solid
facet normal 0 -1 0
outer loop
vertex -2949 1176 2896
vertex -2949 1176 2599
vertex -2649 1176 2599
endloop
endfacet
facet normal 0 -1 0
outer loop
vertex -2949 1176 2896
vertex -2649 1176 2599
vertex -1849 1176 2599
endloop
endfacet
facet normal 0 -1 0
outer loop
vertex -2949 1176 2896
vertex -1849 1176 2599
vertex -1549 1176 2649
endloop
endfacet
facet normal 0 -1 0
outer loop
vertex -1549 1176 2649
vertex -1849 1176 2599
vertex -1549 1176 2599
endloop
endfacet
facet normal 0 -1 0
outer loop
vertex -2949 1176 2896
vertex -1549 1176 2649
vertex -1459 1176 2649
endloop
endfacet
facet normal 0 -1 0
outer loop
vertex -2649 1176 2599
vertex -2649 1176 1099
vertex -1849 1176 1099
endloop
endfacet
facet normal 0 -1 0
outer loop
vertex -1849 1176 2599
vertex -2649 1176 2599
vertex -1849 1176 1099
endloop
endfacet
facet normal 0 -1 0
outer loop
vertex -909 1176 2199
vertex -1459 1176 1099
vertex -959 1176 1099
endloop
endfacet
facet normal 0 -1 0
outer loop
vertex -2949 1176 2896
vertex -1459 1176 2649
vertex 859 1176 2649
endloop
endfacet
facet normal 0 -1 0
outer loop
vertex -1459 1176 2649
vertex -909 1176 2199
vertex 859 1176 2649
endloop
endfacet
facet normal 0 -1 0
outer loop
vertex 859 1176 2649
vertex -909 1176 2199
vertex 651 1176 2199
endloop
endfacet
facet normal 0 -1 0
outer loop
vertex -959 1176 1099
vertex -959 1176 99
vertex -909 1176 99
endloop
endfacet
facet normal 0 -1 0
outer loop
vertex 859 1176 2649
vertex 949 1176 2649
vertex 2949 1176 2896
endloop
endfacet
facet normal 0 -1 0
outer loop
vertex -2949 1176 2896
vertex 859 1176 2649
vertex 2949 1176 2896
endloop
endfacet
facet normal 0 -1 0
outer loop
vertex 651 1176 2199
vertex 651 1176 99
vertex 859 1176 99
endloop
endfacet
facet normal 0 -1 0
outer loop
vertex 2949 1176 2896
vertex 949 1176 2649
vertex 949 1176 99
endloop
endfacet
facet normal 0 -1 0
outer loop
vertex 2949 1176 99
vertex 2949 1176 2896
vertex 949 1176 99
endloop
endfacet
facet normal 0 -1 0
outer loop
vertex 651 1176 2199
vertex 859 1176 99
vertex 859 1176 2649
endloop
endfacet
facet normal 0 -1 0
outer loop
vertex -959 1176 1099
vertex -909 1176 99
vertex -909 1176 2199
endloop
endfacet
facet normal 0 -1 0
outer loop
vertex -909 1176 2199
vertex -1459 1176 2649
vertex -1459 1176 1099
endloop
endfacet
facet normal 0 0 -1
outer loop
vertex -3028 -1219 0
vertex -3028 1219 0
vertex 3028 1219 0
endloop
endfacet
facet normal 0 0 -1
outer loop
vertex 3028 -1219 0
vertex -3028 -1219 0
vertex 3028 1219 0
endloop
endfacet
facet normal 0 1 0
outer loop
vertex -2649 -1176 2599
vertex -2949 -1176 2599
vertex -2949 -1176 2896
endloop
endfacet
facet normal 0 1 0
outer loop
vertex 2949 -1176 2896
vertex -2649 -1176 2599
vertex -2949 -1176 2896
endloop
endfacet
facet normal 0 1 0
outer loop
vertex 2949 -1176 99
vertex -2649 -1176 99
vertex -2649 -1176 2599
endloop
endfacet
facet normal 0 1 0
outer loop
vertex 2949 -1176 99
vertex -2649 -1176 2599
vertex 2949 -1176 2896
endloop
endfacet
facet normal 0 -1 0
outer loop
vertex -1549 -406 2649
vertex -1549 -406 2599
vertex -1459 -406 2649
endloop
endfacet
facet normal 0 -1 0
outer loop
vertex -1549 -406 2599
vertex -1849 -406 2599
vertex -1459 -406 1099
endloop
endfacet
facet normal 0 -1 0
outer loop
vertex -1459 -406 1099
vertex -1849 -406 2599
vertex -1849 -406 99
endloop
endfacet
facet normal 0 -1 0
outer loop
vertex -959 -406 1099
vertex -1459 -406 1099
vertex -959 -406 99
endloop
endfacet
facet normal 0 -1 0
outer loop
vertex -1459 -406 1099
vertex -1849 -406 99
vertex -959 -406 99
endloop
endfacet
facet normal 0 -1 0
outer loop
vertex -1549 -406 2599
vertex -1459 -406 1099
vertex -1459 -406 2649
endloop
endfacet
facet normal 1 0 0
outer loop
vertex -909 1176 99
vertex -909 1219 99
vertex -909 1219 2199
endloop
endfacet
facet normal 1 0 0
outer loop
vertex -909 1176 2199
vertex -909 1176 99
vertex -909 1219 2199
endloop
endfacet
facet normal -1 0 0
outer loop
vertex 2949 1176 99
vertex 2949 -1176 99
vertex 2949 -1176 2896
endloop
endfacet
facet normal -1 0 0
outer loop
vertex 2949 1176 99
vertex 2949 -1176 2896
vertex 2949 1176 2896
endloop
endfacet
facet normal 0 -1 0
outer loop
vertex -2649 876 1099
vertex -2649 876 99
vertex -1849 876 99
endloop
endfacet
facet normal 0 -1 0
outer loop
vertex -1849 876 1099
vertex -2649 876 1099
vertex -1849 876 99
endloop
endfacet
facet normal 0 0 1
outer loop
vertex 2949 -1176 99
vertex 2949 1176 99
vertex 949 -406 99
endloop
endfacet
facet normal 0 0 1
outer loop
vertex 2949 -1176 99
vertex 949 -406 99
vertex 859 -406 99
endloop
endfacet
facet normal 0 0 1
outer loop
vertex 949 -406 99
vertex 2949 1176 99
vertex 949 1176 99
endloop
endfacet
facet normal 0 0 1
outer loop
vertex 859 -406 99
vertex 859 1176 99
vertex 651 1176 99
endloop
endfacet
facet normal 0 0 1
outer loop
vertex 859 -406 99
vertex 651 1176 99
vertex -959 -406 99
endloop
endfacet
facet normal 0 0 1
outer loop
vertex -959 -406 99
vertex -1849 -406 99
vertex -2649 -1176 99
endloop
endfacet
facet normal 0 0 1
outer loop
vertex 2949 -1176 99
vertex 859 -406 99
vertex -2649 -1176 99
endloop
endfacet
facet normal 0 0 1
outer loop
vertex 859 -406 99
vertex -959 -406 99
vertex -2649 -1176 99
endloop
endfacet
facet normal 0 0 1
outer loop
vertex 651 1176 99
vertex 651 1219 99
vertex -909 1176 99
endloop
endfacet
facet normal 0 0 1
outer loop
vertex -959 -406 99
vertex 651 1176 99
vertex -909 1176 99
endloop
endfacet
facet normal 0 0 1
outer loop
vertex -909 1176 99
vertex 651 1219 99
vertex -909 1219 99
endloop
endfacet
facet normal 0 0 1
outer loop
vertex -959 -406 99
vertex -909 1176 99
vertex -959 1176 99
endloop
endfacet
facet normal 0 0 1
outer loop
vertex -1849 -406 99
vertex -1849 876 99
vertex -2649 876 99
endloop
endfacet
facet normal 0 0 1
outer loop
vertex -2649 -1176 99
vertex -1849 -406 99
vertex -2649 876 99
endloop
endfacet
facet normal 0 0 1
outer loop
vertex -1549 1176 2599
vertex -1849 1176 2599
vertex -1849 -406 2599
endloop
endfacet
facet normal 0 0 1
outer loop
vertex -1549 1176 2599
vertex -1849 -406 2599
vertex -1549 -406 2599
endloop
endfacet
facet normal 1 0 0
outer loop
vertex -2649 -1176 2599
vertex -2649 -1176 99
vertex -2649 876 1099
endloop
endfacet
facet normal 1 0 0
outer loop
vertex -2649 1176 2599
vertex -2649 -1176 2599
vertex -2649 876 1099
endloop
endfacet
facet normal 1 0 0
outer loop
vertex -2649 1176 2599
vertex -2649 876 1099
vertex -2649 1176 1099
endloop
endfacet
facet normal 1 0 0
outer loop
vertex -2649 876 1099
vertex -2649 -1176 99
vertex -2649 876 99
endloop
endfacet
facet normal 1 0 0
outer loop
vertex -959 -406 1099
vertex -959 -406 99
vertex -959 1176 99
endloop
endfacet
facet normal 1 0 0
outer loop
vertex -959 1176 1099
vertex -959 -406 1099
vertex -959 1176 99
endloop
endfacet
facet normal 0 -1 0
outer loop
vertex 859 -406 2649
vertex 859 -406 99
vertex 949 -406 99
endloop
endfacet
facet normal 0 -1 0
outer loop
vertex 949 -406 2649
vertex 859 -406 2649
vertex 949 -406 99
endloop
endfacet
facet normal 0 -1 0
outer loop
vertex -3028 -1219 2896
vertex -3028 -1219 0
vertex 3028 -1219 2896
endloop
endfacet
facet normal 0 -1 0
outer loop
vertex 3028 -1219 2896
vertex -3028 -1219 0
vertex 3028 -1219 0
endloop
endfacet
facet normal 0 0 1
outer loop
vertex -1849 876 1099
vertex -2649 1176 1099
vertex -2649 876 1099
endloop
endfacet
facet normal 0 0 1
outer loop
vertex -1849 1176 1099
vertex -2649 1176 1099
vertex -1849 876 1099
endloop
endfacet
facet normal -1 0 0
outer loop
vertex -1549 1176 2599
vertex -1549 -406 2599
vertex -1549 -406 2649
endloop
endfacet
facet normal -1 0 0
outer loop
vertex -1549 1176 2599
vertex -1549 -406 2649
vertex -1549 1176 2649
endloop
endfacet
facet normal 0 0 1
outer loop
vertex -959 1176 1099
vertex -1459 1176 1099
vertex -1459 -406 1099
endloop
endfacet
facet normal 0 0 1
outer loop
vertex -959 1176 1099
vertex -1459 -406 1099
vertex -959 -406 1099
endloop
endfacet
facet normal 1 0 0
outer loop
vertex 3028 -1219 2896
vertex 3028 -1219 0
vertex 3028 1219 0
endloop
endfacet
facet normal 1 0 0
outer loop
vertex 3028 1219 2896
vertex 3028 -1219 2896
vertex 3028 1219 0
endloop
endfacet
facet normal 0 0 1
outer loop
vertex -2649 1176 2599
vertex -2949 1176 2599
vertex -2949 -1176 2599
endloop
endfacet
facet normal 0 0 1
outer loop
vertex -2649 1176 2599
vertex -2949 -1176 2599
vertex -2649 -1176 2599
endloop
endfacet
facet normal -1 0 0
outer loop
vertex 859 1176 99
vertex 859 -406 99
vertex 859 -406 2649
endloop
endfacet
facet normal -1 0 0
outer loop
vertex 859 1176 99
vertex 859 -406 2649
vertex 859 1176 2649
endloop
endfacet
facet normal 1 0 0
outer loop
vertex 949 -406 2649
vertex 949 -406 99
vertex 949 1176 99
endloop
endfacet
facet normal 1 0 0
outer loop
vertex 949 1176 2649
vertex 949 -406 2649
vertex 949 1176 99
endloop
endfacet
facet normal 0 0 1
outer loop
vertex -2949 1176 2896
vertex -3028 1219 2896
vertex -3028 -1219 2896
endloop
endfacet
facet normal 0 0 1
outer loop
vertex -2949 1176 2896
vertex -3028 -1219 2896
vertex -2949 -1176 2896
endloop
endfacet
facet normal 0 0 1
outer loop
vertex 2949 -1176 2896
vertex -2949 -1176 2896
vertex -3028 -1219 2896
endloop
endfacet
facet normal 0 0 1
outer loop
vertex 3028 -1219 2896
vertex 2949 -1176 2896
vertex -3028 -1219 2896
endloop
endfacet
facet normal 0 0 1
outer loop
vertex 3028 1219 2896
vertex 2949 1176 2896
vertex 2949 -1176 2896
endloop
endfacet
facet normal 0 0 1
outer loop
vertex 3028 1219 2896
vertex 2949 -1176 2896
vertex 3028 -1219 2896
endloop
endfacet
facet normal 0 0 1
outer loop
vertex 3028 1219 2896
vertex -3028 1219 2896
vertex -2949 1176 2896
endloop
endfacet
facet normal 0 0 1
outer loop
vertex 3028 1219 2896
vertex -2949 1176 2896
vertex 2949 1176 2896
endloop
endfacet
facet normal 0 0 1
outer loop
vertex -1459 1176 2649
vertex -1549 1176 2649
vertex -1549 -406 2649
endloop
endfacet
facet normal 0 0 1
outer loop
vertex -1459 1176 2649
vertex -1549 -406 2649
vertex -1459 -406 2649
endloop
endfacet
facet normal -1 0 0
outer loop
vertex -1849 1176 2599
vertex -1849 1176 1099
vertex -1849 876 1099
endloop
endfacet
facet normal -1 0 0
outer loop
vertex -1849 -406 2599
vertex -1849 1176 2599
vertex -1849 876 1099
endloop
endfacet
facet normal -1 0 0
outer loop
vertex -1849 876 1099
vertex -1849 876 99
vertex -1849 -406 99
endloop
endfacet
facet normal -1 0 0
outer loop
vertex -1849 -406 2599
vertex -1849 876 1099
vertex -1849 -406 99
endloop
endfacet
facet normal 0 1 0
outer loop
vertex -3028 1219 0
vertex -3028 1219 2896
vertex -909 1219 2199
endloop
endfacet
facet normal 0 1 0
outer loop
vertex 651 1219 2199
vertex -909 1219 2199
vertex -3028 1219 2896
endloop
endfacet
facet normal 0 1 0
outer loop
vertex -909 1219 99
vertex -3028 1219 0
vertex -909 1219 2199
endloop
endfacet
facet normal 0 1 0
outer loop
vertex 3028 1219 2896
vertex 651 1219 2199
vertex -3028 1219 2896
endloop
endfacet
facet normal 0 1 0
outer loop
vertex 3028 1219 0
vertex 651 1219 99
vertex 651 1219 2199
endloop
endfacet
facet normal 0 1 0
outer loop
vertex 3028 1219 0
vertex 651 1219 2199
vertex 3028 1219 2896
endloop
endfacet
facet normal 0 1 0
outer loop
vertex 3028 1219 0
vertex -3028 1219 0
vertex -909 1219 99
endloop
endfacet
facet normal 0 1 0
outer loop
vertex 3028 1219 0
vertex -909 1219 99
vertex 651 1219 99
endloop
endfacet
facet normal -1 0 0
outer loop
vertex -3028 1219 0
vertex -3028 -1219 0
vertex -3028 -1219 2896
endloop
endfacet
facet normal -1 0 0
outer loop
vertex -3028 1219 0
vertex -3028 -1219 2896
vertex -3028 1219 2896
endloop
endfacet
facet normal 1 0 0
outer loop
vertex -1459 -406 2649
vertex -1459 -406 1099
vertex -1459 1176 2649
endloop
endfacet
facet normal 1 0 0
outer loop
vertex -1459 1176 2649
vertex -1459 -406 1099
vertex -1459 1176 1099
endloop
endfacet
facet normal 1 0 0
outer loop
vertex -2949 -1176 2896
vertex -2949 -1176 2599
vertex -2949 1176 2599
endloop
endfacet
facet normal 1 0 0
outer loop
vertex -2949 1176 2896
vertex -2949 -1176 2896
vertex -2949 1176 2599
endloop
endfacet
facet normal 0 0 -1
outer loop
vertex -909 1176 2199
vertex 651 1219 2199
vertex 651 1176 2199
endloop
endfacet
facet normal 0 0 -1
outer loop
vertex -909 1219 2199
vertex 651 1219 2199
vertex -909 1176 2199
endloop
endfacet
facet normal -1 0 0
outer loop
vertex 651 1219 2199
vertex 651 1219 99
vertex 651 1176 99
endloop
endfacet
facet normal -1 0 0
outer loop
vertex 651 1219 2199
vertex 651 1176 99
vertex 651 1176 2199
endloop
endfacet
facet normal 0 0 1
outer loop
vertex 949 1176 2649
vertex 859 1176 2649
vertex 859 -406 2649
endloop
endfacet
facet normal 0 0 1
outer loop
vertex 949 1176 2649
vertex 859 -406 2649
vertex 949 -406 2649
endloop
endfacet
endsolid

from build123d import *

# Parameters (mm, degrees)
F0_W     = 6056
F0_H     = 2438
F0_W_2   = 5898
F0_H_2   = 2352
F1_DEPTH = 2896
F2_DEPTH = 99
F3_W     = 90
F3_H     = 1582
F4_DEPTH = 2550
F5_W     = 1560
F5_H     = 2100
F6_DEPTH = 49
F8_DEPTH = 2500
F7_W     = 800
F7_H     = 300
F7_W_2   = 500
F7_H_2   = 1582
F9_DEPTH = 1000


with BuildPart() as f1:
    # F0 (on Top) → F1 (new body)
    with BuildSketch(Plane.XY):
        Rectangle(F0_W, F0_H)
        Rectangle(F0_W_2, F0_H_2, mode=Mode.SUBTRACT)
    extrude(amount=F1_DEPTH)

    # F0 (on Top) → F2 (join)
    with BuildSketch(Plane.XY):
        Rectangle(F0_W_2, F0_H_2)
    extrude(amount=F2_DEPTH)

    # F3 (on face) → F4 (join)
    with BuildSketch(Plane.XY.offset(99)):
        with Locations((-1504, 385)):
            Rectangle(F3_W, F3_H)
        with Locations((904, 385)):
            Rectangle(F3_W, F3_H)
    extrude(amount=F4_DEPTH)

    # F5 (on face) → F6 (cut)
    with BuildSketch(Plane(origin=(0, 1219, 0), x_dir=(-1, 0, 0), z_dir=(0, 1, 0))):
        with Locations((129, 1149)):
            Rectangle(F5_W, F5_H)
    extrude(amount=-F6_DEPTH, mode=Mode.SUBTRACT)

    # F7 (on face) → F8 (join)
    with BuildSketch(Plane.XY.offset(99)):
        Polygon((-2649, 1176), (-2949, 1176), (-2949, -1176), (-2649, -1176), (-2649, 876), align=None)
        Polygon((-1549, 1176), (-1849, 1176), (-1849, 876), (-1849, -406), (-1549, -406), align=None)
    extrude(amount=F8_DEPTH)

    # F7 (on face) → F9 (join)
    with BuildSketch(Plane.XY.offset(99)):
        with Locations((-2249, 1026)):
            Rectangle(F7_W, F7_H)
        with Locations((-1209, 385)):
            Rectangle(F7_W_2, F7_H_2)
    extrude(amount=F9_DEPTH)


solid = f1.part
